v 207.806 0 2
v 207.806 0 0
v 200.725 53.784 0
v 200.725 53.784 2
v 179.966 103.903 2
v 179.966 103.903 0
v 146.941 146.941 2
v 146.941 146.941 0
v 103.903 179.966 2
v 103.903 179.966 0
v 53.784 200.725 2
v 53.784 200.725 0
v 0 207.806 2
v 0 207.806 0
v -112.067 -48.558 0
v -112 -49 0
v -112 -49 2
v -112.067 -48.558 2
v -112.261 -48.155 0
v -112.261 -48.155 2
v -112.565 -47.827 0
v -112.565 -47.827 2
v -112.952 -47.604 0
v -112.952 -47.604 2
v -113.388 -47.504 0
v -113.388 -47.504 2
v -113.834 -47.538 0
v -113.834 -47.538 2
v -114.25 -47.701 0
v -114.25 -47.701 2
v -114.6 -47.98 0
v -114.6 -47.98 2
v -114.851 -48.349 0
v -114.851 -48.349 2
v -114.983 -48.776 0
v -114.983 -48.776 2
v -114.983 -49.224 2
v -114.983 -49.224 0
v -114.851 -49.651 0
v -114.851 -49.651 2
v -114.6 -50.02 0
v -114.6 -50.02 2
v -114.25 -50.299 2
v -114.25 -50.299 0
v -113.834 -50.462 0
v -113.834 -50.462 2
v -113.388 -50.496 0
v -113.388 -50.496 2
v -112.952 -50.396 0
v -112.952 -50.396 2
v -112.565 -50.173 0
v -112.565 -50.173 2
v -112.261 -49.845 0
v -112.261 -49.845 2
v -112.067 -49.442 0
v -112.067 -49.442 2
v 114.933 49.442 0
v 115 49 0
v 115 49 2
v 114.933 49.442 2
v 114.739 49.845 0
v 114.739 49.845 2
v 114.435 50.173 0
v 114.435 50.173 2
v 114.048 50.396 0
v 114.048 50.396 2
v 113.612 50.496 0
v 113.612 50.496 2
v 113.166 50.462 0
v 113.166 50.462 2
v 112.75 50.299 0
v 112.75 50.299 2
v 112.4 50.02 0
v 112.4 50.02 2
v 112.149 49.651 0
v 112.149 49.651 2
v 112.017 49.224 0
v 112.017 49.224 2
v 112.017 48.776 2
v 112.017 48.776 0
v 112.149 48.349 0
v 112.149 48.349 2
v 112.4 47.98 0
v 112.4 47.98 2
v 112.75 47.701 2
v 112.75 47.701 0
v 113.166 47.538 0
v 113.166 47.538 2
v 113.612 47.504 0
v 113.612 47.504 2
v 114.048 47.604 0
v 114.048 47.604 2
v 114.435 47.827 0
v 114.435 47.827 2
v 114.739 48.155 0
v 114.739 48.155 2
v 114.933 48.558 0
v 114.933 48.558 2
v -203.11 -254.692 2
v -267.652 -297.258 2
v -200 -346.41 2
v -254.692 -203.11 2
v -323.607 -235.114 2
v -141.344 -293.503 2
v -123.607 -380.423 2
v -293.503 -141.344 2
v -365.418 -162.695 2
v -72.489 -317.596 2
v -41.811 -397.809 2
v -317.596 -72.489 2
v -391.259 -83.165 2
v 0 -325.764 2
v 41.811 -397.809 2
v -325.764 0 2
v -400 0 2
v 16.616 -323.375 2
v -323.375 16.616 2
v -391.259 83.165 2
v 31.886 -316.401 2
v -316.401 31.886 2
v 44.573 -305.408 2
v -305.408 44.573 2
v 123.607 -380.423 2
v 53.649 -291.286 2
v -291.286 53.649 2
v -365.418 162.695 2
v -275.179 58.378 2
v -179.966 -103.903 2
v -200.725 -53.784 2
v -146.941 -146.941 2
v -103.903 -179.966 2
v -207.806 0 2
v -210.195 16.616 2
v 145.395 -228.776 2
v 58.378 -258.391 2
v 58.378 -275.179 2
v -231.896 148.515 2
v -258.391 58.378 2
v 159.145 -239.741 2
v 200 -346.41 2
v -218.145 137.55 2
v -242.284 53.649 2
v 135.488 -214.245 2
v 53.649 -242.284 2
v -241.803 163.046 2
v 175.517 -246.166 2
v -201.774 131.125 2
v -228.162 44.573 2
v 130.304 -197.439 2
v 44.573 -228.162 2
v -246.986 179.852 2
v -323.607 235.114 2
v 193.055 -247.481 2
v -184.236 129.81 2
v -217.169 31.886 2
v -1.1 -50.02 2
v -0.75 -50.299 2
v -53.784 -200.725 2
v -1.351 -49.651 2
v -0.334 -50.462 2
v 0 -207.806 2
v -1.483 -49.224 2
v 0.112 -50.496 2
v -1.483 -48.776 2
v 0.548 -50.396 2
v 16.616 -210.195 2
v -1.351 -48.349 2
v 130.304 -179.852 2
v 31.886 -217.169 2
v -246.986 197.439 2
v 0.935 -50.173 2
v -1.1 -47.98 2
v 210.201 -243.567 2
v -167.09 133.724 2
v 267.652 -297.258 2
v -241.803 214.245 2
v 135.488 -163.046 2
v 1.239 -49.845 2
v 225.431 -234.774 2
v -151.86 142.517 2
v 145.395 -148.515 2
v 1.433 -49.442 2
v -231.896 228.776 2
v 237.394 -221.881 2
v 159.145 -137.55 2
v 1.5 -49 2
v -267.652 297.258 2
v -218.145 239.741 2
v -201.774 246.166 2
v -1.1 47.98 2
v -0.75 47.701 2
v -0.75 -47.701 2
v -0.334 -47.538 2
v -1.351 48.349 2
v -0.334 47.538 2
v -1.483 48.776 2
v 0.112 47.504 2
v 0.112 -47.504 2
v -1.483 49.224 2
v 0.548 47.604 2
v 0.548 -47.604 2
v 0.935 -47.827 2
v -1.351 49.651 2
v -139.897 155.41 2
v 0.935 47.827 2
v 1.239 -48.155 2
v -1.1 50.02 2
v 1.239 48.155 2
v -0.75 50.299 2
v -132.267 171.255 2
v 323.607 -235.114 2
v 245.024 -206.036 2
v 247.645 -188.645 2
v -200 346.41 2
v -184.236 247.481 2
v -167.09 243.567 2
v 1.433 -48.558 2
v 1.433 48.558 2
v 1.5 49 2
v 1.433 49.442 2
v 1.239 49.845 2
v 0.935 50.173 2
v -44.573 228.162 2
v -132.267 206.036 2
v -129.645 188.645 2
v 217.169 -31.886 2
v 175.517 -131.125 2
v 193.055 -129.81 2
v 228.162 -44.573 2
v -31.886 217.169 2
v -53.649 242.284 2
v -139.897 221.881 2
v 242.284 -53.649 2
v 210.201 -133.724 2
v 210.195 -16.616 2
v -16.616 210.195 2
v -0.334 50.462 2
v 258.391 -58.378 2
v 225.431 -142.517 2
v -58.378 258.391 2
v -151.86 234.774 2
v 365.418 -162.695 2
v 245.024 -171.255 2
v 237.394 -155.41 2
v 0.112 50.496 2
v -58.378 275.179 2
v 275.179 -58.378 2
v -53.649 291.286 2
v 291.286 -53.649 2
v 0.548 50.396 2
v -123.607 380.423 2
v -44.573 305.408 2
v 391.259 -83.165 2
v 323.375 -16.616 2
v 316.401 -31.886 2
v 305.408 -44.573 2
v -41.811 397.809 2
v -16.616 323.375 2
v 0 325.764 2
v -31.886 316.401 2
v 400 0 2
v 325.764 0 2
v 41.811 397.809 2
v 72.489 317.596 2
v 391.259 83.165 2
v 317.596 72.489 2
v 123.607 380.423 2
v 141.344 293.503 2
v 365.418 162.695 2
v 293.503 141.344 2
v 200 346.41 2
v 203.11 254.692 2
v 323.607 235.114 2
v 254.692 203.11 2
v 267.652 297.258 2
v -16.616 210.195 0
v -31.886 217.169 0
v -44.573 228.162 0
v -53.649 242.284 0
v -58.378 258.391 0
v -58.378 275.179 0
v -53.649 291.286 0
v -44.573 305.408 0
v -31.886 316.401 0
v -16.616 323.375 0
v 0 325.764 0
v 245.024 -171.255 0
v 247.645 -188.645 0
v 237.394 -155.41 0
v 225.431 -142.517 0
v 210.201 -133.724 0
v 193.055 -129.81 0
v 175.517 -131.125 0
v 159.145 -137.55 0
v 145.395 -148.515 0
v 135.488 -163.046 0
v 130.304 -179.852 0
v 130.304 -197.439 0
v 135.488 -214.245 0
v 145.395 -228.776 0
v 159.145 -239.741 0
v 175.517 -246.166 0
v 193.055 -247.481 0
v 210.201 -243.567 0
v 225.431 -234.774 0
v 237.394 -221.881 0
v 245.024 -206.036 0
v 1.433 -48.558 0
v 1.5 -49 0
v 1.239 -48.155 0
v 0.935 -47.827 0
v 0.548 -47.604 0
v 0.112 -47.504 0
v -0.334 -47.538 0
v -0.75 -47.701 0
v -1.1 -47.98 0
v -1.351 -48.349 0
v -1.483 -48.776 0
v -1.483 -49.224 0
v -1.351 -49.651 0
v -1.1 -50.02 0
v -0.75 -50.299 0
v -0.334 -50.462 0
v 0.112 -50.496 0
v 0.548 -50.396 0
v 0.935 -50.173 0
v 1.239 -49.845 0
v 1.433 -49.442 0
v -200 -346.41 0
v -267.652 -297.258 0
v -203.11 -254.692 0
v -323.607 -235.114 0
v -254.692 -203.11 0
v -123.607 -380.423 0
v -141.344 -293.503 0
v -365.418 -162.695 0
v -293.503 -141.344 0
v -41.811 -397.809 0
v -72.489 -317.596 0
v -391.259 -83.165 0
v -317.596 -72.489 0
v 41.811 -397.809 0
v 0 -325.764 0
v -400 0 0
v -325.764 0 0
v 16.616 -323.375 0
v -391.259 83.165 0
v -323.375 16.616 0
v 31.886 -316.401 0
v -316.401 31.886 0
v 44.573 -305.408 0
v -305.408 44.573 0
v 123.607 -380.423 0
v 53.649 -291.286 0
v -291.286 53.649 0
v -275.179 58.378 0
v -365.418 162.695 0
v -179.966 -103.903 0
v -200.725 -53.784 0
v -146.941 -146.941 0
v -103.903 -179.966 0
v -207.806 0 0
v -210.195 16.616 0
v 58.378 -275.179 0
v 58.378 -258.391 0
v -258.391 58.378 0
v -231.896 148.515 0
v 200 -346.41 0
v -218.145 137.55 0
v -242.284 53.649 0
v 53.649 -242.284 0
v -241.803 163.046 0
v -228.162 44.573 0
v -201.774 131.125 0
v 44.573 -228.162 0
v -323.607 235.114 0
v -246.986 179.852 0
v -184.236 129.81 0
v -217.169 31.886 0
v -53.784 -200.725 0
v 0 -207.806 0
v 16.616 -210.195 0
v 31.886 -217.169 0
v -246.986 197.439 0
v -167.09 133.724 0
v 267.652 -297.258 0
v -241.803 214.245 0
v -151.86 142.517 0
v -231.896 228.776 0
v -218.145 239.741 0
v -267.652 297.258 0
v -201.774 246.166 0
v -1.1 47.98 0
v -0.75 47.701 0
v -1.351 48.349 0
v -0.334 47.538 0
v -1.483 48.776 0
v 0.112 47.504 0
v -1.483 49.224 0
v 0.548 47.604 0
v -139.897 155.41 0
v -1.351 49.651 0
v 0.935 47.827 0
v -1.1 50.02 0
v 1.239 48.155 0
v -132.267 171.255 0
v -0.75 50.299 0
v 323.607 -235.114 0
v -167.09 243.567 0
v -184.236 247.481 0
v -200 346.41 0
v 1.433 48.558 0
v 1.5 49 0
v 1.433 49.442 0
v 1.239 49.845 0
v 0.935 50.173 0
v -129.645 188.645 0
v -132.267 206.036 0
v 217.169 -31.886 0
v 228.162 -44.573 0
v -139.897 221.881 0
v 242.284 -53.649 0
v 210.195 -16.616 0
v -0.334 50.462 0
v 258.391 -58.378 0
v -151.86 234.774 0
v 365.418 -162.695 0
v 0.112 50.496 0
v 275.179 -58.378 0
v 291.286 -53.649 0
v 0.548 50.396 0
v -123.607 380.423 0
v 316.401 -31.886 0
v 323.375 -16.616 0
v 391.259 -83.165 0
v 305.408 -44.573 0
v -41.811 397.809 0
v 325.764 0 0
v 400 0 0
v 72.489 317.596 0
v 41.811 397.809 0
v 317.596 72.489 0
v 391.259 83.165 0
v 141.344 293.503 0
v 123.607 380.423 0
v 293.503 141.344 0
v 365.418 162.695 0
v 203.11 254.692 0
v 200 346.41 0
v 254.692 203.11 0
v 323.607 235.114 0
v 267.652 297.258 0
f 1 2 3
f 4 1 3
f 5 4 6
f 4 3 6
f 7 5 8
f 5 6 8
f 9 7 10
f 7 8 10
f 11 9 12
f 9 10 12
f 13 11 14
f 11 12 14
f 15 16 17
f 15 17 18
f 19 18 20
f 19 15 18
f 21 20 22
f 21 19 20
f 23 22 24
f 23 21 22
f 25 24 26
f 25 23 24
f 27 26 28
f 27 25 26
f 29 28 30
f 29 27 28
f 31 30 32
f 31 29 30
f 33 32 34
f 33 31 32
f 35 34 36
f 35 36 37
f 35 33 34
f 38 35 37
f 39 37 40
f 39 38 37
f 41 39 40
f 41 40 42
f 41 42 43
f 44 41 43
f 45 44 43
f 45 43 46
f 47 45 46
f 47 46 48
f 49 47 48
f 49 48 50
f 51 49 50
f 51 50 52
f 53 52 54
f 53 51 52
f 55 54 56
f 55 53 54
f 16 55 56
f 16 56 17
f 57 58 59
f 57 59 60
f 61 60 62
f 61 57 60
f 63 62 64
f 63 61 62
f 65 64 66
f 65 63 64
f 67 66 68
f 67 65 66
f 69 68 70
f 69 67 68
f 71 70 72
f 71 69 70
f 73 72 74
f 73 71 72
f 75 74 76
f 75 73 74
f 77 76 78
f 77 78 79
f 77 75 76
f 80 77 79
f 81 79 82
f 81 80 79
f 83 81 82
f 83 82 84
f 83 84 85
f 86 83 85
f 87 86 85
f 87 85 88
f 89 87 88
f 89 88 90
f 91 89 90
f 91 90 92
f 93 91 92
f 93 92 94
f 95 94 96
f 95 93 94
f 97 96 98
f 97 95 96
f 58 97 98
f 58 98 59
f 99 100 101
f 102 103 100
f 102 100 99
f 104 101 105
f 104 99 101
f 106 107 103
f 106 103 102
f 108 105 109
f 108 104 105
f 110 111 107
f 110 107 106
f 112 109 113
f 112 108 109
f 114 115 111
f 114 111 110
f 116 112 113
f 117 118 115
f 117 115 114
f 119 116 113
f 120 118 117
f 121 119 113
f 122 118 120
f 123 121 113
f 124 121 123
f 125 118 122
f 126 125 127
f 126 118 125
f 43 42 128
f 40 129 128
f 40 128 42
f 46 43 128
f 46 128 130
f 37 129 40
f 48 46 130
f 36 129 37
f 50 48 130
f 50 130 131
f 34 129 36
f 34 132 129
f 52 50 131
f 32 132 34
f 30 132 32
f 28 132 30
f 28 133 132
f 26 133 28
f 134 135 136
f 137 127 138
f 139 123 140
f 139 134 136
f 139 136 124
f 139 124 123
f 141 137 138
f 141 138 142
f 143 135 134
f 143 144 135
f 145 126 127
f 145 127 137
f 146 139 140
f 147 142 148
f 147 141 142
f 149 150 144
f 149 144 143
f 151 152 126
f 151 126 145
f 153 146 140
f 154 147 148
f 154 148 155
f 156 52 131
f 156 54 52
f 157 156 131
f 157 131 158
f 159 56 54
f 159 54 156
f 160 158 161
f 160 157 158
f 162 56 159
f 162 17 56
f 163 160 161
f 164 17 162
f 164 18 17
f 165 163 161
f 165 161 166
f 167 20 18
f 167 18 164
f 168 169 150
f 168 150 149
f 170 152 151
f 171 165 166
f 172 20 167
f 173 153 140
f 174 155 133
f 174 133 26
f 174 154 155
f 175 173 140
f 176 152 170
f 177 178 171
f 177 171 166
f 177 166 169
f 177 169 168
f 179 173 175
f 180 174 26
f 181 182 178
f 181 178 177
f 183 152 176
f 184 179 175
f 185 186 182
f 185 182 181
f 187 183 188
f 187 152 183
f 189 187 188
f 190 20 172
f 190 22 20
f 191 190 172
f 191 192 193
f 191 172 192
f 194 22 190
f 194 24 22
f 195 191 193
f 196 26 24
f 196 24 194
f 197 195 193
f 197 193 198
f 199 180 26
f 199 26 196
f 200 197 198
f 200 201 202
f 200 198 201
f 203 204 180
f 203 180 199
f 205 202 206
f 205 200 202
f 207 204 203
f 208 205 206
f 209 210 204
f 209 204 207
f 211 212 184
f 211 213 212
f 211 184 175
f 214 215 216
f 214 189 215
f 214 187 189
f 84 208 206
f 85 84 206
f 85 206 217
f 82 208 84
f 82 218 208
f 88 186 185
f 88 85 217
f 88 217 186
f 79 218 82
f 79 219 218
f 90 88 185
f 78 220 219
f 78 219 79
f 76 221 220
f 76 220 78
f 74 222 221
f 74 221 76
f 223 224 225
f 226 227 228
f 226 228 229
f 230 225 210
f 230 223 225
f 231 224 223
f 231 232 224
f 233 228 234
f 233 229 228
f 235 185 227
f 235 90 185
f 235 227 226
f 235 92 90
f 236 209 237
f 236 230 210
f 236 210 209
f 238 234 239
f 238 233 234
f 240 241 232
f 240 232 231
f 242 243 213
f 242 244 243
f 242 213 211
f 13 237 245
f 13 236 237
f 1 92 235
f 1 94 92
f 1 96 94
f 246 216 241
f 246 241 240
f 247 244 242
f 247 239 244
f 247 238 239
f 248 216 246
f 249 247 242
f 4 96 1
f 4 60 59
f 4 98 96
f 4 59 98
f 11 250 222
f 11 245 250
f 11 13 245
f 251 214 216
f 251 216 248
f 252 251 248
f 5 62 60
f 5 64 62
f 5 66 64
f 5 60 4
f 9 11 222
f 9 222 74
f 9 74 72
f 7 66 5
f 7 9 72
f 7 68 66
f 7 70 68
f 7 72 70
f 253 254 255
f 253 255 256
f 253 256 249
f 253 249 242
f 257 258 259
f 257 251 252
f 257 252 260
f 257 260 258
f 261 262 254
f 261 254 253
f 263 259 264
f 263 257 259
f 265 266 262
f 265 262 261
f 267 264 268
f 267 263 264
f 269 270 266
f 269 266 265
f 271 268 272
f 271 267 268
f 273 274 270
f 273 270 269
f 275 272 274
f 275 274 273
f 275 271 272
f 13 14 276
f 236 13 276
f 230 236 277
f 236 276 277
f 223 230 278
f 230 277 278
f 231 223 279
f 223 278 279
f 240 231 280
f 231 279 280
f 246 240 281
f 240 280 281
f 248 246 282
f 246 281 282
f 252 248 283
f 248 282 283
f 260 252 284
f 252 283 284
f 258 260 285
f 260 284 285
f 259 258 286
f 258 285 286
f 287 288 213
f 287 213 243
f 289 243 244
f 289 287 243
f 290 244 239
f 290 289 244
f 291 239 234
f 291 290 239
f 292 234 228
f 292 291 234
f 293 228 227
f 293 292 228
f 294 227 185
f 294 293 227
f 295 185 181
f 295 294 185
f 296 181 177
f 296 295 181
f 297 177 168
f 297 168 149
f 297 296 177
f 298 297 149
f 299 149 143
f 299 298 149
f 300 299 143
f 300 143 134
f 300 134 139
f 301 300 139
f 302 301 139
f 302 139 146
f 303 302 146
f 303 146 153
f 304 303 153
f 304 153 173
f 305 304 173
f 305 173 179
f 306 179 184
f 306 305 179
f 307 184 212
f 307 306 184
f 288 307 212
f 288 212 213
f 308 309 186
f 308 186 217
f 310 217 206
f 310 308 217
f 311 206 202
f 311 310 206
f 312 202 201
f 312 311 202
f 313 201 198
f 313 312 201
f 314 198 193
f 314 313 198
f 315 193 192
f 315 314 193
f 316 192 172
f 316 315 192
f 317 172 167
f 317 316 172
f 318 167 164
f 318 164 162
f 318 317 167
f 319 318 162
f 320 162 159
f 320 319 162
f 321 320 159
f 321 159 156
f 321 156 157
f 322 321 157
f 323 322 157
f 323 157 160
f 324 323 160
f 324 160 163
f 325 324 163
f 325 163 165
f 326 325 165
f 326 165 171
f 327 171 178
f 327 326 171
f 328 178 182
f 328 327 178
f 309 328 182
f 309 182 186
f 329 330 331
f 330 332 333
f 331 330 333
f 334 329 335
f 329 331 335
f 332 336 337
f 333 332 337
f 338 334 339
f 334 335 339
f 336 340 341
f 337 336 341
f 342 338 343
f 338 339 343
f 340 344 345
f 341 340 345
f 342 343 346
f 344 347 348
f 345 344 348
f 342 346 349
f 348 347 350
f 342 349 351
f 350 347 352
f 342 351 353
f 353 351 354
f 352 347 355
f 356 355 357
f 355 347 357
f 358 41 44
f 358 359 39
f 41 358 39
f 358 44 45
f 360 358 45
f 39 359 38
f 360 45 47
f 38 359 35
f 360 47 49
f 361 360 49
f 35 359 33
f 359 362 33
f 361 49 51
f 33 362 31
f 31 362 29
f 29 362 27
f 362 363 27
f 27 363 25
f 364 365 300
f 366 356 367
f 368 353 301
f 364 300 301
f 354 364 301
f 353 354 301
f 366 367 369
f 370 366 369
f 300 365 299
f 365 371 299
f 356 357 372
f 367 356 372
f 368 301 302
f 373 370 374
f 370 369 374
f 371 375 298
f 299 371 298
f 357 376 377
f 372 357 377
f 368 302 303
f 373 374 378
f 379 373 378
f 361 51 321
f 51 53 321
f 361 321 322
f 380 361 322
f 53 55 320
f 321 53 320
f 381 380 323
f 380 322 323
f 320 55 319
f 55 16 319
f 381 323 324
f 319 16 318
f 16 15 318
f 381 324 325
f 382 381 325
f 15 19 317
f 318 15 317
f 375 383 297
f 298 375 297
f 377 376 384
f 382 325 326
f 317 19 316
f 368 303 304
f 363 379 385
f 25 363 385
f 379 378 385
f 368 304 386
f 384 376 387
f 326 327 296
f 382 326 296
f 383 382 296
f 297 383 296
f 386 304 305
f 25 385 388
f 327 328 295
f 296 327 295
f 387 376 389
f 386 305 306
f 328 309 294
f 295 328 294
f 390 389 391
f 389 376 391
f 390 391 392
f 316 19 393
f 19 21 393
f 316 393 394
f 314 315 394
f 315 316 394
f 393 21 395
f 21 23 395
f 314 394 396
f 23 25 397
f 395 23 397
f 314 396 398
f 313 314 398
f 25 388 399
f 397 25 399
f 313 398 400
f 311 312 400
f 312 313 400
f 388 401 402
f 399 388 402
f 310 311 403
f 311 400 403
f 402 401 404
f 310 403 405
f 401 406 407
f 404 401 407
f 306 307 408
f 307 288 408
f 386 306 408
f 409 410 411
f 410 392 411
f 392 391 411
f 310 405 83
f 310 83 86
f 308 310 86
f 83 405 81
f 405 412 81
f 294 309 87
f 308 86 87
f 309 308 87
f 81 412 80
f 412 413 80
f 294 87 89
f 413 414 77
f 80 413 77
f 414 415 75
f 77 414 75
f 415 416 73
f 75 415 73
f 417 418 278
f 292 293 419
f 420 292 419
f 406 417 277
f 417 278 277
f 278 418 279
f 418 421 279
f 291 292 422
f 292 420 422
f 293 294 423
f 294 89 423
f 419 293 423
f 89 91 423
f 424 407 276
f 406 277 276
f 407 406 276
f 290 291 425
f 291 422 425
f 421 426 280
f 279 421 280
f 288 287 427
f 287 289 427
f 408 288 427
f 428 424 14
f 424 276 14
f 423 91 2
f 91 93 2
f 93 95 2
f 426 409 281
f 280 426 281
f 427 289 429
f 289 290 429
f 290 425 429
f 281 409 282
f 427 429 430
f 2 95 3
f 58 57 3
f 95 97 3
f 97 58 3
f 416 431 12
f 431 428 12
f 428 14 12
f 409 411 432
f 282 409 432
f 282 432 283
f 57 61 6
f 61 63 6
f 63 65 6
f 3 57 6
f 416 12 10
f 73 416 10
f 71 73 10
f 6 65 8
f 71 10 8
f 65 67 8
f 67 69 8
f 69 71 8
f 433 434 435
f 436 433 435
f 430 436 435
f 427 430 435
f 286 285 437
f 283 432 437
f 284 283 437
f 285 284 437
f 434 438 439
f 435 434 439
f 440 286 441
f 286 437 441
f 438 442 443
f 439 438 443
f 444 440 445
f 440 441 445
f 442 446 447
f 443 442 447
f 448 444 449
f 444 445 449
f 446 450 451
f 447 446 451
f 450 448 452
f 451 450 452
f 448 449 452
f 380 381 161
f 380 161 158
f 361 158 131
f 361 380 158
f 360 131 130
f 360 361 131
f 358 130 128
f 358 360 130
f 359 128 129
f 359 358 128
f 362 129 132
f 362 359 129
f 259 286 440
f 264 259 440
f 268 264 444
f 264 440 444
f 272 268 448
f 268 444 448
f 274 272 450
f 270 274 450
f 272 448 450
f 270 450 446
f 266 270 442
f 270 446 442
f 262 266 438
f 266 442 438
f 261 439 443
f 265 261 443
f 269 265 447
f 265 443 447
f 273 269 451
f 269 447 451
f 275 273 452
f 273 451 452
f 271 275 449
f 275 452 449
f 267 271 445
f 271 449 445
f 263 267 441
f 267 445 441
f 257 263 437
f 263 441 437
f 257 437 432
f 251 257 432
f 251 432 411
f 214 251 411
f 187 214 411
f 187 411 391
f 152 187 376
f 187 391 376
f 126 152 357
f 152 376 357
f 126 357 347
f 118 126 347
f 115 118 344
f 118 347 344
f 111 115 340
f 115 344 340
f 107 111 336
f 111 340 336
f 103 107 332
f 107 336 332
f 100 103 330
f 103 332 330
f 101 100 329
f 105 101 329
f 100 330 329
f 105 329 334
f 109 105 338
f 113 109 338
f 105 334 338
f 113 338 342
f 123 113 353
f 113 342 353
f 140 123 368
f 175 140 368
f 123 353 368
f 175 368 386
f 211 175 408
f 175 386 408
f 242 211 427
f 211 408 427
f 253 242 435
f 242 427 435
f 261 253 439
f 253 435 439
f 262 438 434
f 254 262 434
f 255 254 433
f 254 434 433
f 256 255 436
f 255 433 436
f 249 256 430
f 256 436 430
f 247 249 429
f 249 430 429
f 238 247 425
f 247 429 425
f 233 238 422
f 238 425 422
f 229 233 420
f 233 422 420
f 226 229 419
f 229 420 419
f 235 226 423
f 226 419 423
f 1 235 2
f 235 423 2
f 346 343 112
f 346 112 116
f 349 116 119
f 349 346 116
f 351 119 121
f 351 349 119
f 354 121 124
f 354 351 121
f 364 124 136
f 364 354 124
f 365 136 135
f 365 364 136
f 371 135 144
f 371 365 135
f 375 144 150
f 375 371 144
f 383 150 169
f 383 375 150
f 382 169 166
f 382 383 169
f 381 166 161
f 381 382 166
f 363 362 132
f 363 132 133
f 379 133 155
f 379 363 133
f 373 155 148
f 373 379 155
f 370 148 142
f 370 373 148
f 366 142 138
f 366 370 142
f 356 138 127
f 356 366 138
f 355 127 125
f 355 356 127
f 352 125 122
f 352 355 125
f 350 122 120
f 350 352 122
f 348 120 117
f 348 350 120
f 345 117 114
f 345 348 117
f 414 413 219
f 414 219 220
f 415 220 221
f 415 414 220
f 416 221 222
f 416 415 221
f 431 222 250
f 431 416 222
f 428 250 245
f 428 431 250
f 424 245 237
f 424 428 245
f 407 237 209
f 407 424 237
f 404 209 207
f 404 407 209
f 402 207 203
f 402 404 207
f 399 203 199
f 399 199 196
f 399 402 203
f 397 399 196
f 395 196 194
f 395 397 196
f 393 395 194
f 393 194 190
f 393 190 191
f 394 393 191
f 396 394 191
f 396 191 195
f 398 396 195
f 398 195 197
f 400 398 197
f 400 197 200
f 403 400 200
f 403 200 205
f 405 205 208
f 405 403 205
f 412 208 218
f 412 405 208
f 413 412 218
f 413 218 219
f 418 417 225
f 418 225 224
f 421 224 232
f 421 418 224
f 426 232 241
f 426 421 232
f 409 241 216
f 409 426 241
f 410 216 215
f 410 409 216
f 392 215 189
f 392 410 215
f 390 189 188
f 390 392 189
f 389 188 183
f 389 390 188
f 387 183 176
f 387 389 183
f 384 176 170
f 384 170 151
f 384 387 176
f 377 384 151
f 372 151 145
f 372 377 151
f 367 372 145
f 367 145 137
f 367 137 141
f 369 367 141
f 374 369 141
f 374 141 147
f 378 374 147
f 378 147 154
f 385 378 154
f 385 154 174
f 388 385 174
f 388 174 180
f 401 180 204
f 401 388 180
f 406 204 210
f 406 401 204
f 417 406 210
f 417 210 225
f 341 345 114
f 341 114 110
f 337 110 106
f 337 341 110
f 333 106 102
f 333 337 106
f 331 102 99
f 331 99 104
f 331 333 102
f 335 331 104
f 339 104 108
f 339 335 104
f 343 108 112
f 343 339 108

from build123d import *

# Parameters (mm, degrees)
SKETCH_1_R      = 400
SKETCH_1_R_2    = 1.5
SKETCH_1_R_3    = 59
EXTRUDE_1_DEPTH = 2


with BuildPart() as part:
    # 草图1 → 凸台-拉伸1 (new body)
    with BuildSketch(Plane.XY):
        Circle(SKETCH_1_R)
        with Locations((0, -49)):
            Circle(SKETCH_1_R_2, mode=Mode.SUBTRACT)
        with Locations((0, 49)):
            Circle(SKETCH_1_R_2, mode=Mode.SUBTRACT)
        with Locations((-113.5, -49)):
            Circle(SKETCH_1_R_2, mode=Mode.SUBTRACT)
        with Locations((113.5, 49)):
            Circle(SKETCH_1_R_2, mode=Mode.SUBTRACT)
        with Locations((-188.645478562, 188.645478562)):
            Circle(SKETCH_1_R_3, mode=Mode.SUBTRACT)
        with Locations((188.645478562, -188.645478562)):
            Circle(SKETCH_1_R_3, mode=Mode.SUBTRACT)
        with BuildLine():
            ThreePointArc((-325.763672953, 0), (-230.349702209, -230.349702209), (0, -325.763672953))
            ThreePointArc((0, -325.763672953), (58.97867869, -266.784994263), (0, -207.806315572))
            ThreePointArc((0, -207.806315572), (-146.941254915, -146.941254915), (-207.806315572, 0))
            ThreePointArc((-207.806315572, 0), (-266.784994263, 58.97867869), (-325.763672953, 0))
        make_face(mode=Mode.SUBTRACT)
        with BuildLine():
            ThreePointArc((0, 325.763672953), (230.349702209, 230.349702209), (325.763672953, 0))
            ThreePointArc((325.763672953, 0), (266.784994263, -58.97867869), (207.806315572, 0))
            ThreePointArc((207.806315572, 0), (146.941254915, 146.941254915), (0, 207.806315572))
            ThreePointArc((0, 207.806315572), (-58.97867869, 266.784994263), (0, 325.763672953))
        make_face(mode=Mode.SUBTRACT)
    extrude(amount=EXTRUDE_1_DEPTH)


solid = part.part
